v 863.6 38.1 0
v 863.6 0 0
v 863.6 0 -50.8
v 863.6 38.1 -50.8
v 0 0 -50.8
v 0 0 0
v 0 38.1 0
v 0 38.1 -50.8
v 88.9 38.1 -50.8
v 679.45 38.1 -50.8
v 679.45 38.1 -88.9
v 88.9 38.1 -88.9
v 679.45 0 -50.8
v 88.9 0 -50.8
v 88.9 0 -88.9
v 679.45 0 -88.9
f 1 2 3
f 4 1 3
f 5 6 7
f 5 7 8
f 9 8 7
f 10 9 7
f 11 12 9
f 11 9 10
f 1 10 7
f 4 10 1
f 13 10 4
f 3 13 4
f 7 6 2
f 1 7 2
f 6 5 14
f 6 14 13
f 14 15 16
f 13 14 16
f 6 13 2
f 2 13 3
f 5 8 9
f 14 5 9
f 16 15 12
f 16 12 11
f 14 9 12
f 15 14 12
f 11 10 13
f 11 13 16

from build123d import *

# Parameters (mm, degrees)
SKETCH1_W           = 863.6
SKETCH1_H           = 88.9
BOSS_EXTRUDE1_DEPTH = 38.1
SKETCH3_W           = 184.15
SKETCH3_H           = 38.1
CUT_EXTRUDE1_DEPTH  = 39.1
SKETCH4_W           = 88.9
SKETCH4_H           = 38.1
CUT_EXTRUDE2_DEPTH  = 39.1


with BuildPart() as part:
    # Sketch1 → Boss-Extrude1 (new body)
    with BuildSketch(Plane(origin=(0, 0, 0), x_dir=(1, 0, 0), z_dir=(0, 1, 0))):
        with Locations((431.8, 44.45)):
            Rectangle(SKETCH1_W, SKETCH1_H)
    extrude(amount=BOSS_EXTRUDE1_DEPTH)

    # Sketch3 → Cut-Extrude1 (cut, through all)
    with BuildSketch(Plane(origin=(0, 38.1, 0), x_dir=(1, 0, 0), z_dir=(0, 1, 0))):
        with Locations((771.525, 69.85)):
            Rectangle(SKETCH3_W, SKETCH3_H)
    extrude(amount=-CUT_EXTRUDE1_DEPTH, mode=Mode.SUBTRACT)

    # Sketch4 → Cut-Extrude2 (cut, through all)
    with BuildSketch(Plane(origin=(0, 38.1, 0), x_dir=(1, 0, 0), z_dir=(0, 1, 0))):
        with Locations((44.45, 69.85)):
            Rectangle(SKETCH4_W, SKETCH4_H)
    extrude(amount=-CUT_EXTRUDE2_DEPTH, mode=Mode.SUBTRACT)


solid = part.part
